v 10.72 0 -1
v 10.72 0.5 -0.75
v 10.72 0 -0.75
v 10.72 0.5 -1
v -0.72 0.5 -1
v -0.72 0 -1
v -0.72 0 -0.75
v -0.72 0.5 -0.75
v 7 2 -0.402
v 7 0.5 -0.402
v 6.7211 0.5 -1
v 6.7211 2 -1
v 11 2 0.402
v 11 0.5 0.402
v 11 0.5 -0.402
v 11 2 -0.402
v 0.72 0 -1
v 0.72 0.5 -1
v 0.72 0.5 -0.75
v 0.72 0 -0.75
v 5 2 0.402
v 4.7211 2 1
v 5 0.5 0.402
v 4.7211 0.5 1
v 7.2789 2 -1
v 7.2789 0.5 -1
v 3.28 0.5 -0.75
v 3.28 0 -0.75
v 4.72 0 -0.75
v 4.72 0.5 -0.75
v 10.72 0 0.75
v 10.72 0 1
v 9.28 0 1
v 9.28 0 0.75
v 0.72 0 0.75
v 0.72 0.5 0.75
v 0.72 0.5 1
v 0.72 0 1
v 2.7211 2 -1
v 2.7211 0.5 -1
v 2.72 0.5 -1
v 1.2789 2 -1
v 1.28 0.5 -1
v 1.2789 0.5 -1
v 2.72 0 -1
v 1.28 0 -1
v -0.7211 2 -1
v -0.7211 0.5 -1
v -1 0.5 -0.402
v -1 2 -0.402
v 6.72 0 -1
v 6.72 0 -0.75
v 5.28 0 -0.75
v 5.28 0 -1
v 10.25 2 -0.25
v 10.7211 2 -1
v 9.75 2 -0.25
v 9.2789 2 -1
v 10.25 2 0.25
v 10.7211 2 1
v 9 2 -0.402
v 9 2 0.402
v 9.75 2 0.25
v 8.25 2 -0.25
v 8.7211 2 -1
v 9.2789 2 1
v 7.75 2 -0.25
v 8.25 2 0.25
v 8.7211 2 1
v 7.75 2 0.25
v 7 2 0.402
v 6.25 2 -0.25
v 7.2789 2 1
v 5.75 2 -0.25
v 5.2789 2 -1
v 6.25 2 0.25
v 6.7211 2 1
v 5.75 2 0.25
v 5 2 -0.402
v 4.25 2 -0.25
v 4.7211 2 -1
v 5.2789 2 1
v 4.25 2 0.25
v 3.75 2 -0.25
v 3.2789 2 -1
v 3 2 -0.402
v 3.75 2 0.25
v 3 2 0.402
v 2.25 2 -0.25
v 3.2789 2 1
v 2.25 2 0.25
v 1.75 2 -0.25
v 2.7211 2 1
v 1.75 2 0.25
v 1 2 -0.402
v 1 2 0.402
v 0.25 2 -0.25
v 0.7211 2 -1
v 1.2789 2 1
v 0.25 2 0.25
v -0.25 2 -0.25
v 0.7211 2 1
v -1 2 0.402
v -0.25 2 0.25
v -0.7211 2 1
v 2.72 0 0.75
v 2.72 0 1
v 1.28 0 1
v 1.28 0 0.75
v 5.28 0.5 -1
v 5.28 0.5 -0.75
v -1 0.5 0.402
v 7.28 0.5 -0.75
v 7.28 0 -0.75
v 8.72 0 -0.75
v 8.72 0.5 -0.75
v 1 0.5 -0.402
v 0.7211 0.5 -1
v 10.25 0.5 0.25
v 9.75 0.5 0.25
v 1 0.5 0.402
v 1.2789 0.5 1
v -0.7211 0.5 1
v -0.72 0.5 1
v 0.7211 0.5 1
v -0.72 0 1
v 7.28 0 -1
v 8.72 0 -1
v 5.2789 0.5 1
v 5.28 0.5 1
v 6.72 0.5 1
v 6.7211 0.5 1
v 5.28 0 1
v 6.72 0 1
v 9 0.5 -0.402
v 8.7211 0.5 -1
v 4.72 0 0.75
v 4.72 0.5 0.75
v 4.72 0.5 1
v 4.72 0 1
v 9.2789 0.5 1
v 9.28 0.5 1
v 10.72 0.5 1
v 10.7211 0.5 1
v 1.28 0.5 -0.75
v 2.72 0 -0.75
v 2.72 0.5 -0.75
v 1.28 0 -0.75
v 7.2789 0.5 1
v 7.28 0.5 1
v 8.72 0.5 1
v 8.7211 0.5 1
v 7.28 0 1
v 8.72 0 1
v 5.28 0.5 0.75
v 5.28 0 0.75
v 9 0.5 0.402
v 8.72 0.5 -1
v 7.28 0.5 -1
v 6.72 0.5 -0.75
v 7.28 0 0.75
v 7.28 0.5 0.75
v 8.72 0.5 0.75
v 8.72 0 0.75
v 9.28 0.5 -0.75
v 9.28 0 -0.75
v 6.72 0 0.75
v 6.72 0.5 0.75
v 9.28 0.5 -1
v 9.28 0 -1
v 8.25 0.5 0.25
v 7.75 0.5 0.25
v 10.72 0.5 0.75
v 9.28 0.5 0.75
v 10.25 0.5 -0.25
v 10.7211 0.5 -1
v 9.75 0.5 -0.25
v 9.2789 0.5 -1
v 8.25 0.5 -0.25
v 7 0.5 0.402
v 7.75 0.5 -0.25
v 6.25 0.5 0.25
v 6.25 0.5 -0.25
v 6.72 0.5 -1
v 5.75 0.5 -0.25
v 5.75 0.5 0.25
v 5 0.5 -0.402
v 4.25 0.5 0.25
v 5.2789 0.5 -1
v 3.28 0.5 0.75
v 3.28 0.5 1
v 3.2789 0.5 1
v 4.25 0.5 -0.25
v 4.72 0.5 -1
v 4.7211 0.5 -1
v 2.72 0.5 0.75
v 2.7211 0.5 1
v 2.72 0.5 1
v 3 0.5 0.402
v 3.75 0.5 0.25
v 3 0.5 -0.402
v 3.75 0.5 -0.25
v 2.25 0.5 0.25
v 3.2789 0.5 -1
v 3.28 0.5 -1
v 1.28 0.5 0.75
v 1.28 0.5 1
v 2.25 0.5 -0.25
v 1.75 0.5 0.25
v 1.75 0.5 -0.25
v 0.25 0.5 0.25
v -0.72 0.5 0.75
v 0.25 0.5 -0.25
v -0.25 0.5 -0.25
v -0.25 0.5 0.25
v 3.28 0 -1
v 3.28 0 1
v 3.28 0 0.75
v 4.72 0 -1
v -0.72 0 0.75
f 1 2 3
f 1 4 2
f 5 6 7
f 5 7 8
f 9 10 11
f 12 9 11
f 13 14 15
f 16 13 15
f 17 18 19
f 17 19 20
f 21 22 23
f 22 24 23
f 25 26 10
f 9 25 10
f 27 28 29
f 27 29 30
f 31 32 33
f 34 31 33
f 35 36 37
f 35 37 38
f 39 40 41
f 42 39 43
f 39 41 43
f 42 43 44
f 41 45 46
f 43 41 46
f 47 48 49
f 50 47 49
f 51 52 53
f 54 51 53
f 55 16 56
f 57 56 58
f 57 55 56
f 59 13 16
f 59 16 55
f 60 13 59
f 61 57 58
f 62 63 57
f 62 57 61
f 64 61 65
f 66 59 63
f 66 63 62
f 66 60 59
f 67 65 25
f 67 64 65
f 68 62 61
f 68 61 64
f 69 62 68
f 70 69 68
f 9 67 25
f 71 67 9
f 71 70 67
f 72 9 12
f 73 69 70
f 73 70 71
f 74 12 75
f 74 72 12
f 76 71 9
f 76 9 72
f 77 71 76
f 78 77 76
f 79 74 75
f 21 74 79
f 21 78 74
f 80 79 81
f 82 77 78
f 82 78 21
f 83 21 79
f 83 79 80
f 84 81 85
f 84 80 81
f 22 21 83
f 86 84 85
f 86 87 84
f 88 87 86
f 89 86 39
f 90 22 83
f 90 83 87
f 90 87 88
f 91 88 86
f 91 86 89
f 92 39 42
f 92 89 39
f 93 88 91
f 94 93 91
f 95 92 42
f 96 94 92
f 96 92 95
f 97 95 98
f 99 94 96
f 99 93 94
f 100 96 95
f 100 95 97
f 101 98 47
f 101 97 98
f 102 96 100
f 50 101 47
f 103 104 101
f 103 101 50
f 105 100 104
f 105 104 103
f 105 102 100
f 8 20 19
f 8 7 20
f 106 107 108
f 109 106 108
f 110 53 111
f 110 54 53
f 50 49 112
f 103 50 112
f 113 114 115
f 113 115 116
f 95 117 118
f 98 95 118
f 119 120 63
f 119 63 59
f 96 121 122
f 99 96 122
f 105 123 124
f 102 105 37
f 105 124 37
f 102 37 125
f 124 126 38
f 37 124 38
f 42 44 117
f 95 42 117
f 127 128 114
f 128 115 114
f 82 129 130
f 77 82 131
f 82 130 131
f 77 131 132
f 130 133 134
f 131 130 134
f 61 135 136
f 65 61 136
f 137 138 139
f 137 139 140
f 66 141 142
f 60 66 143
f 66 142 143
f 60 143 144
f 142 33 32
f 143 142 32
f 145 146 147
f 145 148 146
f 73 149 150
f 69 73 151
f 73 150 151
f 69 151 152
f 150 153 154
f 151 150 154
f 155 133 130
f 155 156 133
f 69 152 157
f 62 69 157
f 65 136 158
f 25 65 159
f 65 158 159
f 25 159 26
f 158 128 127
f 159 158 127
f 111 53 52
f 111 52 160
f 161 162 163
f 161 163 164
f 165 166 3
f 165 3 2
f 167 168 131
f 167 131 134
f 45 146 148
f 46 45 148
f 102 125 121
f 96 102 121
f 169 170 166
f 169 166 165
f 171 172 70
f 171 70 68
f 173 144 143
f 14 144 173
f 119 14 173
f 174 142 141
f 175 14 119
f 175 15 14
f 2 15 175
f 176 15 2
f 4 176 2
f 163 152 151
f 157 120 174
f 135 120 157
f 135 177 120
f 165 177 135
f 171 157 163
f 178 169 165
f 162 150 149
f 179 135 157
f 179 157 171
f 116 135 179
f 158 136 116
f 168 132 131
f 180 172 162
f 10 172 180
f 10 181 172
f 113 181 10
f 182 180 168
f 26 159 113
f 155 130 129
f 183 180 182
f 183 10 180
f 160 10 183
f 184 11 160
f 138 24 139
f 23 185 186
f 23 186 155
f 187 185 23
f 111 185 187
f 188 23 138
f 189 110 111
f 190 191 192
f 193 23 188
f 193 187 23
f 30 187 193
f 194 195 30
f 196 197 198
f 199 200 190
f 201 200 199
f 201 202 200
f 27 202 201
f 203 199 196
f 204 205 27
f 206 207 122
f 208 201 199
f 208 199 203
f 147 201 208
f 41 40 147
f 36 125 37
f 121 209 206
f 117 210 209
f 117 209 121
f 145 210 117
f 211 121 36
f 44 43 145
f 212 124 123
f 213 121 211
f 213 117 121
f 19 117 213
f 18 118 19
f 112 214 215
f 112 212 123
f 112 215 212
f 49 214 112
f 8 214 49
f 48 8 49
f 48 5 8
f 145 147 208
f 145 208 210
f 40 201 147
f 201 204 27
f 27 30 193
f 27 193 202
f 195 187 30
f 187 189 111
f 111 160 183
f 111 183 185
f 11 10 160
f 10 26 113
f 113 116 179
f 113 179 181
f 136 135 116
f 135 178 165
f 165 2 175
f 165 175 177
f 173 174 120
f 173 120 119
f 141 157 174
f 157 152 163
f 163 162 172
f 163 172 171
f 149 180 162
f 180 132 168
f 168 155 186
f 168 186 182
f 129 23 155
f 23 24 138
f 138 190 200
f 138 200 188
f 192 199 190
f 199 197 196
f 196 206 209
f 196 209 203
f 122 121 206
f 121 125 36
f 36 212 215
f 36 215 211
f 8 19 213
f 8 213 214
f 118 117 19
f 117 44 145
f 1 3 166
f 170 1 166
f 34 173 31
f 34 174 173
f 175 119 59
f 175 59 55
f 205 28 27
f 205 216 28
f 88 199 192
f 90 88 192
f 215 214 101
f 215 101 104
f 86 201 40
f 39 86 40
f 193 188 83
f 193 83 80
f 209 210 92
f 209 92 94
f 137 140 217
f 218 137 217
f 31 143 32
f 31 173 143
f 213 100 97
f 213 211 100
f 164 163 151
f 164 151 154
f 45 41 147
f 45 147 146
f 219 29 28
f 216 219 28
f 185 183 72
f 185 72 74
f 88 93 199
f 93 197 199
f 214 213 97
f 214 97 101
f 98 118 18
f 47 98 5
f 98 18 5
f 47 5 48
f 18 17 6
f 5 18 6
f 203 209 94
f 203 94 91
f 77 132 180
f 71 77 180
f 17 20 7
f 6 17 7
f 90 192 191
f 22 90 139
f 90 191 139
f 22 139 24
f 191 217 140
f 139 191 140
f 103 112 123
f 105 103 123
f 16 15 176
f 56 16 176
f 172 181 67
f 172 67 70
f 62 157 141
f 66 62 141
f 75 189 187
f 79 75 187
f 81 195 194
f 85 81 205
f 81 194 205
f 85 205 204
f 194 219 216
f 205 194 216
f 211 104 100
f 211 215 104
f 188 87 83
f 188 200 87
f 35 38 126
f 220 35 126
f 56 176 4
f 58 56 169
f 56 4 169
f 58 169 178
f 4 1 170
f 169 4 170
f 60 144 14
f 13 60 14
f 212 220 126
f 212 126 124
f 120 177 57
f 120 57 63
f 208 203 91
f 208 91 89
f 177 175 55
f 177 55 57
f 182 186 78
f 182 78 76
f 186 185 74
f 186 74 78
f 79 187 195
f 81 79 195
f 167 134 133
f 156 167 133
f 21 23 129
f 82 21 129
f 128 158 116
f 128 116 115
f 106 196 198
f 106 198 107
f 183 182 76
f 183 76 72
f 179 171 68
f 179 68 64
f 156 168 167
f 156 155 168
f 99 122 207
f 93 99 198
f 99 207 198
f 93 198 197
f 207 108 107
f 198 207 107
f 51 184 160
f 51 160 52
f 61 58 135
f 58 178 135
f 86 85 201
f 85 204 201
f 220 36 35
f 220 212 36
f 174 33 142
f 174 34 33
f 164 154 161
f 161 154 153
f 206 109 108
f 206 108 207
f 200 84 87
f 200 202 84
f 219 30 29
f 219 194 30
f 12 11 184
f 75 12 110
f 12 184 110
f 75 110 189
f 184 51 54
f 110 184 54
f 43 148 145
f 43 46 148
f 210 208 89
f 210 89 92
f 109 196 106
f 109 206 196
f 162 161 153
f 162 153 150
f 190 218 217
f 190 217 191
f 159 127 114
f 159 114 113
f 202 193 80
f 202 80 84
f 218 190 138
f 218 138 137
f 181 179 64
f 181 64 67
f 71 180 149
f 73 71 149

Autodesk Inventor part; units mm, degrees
sketch "Sketch_2" plane through (0, 0, 0) normal (0, 1, 0) x (-1, 0, 0)
  line L0 (1, -0.402) -> (1, 0.402)
  line L1 (1, 0.402) -> (0.7211, 1)
  line L2 (0.7211, 1) -> (-0.7211, 1)
  line L3 (-0.7211, 1) -> (-1, 0.402)
  line L4 (-1, 0.402) -> (-1, -0.402)
  line L5 (-1, -0.402) -> (-0.7211, -1)
  line L6 (-0.7211, -1) -> (0.7211, -1)
  line L7 (0.7211, -1) -> (1, -0.402)
extrude "Extrusion1" add sketch "Sketch_2" along normal blind 2
pattern_linear "Rectangular Pattern1" count 6 spacing 2 along (1, 0, 0) of "Extrusion1"
sketch "Sketch_6" plane through (-1, 0, 0) normal (1, 0, 0) x (0, 0, -1)
  line L0 (-0.75, 0.5) -> (-0.75, 0)
  line L1 (-0.75, 0) -> (0.75, 0)
  line L2 (0.75, 0) -> (0.75, 0.5)
  line L3 (0.75, 0.5) -> (-0.75, 0.5)
extrude "Extrusion2" cut sketch "Sketch_6" along normal blind 12
sketch "Sketch_4" plane through (0, 0, 0) normal (0, 1, 0) x (-1, 0, 0)
  line L0 (0.25, -0.25) -> (0.25, 0.25)
  line L1 (0.25, 0.25) -> (-0.25, 0.25)
  line L2 (-0.25, 0.25) -> (-0.25, -0.25)
  line L3 (-0.25, -0.25) -> (0.25, -0.25)
extrude "Extrusion3" cut sketch "Sketch_4" along normal blind 2
pattern_linear "Rectangular Pattern2" count 6 spacing 2 along (1, 0, 0) of "Extrusion3"
sketch "Sketch_9" plane through (0, 0, 0) normal (0, 0, 1) x (1, 0, 0)
  line L0 (-1.28, 0.5) -> (-1.28, 0)
  line L1 (-1.28, 0) -> (-0.72, 0)
  line L2 (-0.72, 0) -> (-0.72, 0.5)
  line L3 (-0.72, 0.5) -> (-1.28, 0.5)
extrude "Extrusion4" cut sketch "Sketch_9" along normal mid plane 2
pattern_linear "Rectangular Pattern3" count 7 spacing 2 along (1, 0, 0) of "Extrusion4"
ref_plane "FOR_PIN_1_XY" through (0, 2, 0) normal (0, 1, 0) x (1, 0, 0)
ref_plane "FOR_PIN_1_YZ" through (0, 2, 0) normal (1, 0, 0) x (0, 0, -1)
ref_plane "FOR_PIN_1_ZX" through (0, 2, 0) normal (0, 0, -1) x (0, 1, 0)
ref_plane "FOR_PIN_2_XY" through (2, 2, 0) normal (0, 1, 0) x (1, 0, 0)
ref_plane "FOR_PIN_2_YZ" through (2, 2, 0) normal (1, 0, 0) x (0, 0, -1)
ref_plane "FOR_PIN_2_ZX" through (2, 2, 0) normal (0, 0, -1) x (0, 1, 0)
ref_plane "FOR_PIN_3_XY" through (4, 2, 0) normal (0, 1, 0) x (1, 0, 0)
ref_plane "FOR_PIN_3_YZ" through (4, 2, 0) normal (1, 0, 0) x (0, 0, -1)
ref_plane "FOR_PIN_3_ZX" through (4, 2, 0) normal (0, 0, -1) x (0, 1, 0)
ref_plane "FOR_PIN_4_XY" through (6, 2, 0) normal (0, 1, 0) x (1, 0, 0)
ref_plane "FOR_PIN_4_YZ" through (6, 2, 0) normal (1, 0, 0) x (0, 0, -1)
ref_plane "FOR_PIN_4_ZX" through (6, 2, 0) normal (0, 0, -1) x (0, 1, 0)
ref_plane "FOR_PIN_5_XY" through (8, 2, 0) normal (0, 1, 0) x (1, 0, 0)
ref_plane "FOR_PIN_5_YZ" through (8, 2, 0) normal (1, 0, 0) x (0, 0, -1)
ref_plane "FOR_PIN_5_ZX" through (8, 2, 0) normal (0, 0, -1) x (0, 1, 0)
ref_plane "FOR_PIN_6_XY" through (10, 2, 0) normal (0, 1, 0) x (1, 0, 0)
ref_plane "FOR_PIN_6_YZ" through (10, 2, 0) normal (1, 0, 0) x (0, 0, -1)
ref_plane "FOR_PIN_6_ZX" through (10, 2, 0) normal (0, 0, -1) x (0, 1, 0)
ref_plane "IP_HOUSING_XY" through (-1, 0, 0) normal (0, 1, 0) x (1, 0, 0)
ref_plane "IP_HOUSING_YZ" through (-1, 0, 0) normal (1, 0, 0) x (0, 0, -1)
ref_plane "IP_HOUSING_ZX" through (-1, 0, 0) normal (0, 0, -1) x (0, 1, 0)
properties part number "BF021-06-A-B-0400-0280-N-G_H"
